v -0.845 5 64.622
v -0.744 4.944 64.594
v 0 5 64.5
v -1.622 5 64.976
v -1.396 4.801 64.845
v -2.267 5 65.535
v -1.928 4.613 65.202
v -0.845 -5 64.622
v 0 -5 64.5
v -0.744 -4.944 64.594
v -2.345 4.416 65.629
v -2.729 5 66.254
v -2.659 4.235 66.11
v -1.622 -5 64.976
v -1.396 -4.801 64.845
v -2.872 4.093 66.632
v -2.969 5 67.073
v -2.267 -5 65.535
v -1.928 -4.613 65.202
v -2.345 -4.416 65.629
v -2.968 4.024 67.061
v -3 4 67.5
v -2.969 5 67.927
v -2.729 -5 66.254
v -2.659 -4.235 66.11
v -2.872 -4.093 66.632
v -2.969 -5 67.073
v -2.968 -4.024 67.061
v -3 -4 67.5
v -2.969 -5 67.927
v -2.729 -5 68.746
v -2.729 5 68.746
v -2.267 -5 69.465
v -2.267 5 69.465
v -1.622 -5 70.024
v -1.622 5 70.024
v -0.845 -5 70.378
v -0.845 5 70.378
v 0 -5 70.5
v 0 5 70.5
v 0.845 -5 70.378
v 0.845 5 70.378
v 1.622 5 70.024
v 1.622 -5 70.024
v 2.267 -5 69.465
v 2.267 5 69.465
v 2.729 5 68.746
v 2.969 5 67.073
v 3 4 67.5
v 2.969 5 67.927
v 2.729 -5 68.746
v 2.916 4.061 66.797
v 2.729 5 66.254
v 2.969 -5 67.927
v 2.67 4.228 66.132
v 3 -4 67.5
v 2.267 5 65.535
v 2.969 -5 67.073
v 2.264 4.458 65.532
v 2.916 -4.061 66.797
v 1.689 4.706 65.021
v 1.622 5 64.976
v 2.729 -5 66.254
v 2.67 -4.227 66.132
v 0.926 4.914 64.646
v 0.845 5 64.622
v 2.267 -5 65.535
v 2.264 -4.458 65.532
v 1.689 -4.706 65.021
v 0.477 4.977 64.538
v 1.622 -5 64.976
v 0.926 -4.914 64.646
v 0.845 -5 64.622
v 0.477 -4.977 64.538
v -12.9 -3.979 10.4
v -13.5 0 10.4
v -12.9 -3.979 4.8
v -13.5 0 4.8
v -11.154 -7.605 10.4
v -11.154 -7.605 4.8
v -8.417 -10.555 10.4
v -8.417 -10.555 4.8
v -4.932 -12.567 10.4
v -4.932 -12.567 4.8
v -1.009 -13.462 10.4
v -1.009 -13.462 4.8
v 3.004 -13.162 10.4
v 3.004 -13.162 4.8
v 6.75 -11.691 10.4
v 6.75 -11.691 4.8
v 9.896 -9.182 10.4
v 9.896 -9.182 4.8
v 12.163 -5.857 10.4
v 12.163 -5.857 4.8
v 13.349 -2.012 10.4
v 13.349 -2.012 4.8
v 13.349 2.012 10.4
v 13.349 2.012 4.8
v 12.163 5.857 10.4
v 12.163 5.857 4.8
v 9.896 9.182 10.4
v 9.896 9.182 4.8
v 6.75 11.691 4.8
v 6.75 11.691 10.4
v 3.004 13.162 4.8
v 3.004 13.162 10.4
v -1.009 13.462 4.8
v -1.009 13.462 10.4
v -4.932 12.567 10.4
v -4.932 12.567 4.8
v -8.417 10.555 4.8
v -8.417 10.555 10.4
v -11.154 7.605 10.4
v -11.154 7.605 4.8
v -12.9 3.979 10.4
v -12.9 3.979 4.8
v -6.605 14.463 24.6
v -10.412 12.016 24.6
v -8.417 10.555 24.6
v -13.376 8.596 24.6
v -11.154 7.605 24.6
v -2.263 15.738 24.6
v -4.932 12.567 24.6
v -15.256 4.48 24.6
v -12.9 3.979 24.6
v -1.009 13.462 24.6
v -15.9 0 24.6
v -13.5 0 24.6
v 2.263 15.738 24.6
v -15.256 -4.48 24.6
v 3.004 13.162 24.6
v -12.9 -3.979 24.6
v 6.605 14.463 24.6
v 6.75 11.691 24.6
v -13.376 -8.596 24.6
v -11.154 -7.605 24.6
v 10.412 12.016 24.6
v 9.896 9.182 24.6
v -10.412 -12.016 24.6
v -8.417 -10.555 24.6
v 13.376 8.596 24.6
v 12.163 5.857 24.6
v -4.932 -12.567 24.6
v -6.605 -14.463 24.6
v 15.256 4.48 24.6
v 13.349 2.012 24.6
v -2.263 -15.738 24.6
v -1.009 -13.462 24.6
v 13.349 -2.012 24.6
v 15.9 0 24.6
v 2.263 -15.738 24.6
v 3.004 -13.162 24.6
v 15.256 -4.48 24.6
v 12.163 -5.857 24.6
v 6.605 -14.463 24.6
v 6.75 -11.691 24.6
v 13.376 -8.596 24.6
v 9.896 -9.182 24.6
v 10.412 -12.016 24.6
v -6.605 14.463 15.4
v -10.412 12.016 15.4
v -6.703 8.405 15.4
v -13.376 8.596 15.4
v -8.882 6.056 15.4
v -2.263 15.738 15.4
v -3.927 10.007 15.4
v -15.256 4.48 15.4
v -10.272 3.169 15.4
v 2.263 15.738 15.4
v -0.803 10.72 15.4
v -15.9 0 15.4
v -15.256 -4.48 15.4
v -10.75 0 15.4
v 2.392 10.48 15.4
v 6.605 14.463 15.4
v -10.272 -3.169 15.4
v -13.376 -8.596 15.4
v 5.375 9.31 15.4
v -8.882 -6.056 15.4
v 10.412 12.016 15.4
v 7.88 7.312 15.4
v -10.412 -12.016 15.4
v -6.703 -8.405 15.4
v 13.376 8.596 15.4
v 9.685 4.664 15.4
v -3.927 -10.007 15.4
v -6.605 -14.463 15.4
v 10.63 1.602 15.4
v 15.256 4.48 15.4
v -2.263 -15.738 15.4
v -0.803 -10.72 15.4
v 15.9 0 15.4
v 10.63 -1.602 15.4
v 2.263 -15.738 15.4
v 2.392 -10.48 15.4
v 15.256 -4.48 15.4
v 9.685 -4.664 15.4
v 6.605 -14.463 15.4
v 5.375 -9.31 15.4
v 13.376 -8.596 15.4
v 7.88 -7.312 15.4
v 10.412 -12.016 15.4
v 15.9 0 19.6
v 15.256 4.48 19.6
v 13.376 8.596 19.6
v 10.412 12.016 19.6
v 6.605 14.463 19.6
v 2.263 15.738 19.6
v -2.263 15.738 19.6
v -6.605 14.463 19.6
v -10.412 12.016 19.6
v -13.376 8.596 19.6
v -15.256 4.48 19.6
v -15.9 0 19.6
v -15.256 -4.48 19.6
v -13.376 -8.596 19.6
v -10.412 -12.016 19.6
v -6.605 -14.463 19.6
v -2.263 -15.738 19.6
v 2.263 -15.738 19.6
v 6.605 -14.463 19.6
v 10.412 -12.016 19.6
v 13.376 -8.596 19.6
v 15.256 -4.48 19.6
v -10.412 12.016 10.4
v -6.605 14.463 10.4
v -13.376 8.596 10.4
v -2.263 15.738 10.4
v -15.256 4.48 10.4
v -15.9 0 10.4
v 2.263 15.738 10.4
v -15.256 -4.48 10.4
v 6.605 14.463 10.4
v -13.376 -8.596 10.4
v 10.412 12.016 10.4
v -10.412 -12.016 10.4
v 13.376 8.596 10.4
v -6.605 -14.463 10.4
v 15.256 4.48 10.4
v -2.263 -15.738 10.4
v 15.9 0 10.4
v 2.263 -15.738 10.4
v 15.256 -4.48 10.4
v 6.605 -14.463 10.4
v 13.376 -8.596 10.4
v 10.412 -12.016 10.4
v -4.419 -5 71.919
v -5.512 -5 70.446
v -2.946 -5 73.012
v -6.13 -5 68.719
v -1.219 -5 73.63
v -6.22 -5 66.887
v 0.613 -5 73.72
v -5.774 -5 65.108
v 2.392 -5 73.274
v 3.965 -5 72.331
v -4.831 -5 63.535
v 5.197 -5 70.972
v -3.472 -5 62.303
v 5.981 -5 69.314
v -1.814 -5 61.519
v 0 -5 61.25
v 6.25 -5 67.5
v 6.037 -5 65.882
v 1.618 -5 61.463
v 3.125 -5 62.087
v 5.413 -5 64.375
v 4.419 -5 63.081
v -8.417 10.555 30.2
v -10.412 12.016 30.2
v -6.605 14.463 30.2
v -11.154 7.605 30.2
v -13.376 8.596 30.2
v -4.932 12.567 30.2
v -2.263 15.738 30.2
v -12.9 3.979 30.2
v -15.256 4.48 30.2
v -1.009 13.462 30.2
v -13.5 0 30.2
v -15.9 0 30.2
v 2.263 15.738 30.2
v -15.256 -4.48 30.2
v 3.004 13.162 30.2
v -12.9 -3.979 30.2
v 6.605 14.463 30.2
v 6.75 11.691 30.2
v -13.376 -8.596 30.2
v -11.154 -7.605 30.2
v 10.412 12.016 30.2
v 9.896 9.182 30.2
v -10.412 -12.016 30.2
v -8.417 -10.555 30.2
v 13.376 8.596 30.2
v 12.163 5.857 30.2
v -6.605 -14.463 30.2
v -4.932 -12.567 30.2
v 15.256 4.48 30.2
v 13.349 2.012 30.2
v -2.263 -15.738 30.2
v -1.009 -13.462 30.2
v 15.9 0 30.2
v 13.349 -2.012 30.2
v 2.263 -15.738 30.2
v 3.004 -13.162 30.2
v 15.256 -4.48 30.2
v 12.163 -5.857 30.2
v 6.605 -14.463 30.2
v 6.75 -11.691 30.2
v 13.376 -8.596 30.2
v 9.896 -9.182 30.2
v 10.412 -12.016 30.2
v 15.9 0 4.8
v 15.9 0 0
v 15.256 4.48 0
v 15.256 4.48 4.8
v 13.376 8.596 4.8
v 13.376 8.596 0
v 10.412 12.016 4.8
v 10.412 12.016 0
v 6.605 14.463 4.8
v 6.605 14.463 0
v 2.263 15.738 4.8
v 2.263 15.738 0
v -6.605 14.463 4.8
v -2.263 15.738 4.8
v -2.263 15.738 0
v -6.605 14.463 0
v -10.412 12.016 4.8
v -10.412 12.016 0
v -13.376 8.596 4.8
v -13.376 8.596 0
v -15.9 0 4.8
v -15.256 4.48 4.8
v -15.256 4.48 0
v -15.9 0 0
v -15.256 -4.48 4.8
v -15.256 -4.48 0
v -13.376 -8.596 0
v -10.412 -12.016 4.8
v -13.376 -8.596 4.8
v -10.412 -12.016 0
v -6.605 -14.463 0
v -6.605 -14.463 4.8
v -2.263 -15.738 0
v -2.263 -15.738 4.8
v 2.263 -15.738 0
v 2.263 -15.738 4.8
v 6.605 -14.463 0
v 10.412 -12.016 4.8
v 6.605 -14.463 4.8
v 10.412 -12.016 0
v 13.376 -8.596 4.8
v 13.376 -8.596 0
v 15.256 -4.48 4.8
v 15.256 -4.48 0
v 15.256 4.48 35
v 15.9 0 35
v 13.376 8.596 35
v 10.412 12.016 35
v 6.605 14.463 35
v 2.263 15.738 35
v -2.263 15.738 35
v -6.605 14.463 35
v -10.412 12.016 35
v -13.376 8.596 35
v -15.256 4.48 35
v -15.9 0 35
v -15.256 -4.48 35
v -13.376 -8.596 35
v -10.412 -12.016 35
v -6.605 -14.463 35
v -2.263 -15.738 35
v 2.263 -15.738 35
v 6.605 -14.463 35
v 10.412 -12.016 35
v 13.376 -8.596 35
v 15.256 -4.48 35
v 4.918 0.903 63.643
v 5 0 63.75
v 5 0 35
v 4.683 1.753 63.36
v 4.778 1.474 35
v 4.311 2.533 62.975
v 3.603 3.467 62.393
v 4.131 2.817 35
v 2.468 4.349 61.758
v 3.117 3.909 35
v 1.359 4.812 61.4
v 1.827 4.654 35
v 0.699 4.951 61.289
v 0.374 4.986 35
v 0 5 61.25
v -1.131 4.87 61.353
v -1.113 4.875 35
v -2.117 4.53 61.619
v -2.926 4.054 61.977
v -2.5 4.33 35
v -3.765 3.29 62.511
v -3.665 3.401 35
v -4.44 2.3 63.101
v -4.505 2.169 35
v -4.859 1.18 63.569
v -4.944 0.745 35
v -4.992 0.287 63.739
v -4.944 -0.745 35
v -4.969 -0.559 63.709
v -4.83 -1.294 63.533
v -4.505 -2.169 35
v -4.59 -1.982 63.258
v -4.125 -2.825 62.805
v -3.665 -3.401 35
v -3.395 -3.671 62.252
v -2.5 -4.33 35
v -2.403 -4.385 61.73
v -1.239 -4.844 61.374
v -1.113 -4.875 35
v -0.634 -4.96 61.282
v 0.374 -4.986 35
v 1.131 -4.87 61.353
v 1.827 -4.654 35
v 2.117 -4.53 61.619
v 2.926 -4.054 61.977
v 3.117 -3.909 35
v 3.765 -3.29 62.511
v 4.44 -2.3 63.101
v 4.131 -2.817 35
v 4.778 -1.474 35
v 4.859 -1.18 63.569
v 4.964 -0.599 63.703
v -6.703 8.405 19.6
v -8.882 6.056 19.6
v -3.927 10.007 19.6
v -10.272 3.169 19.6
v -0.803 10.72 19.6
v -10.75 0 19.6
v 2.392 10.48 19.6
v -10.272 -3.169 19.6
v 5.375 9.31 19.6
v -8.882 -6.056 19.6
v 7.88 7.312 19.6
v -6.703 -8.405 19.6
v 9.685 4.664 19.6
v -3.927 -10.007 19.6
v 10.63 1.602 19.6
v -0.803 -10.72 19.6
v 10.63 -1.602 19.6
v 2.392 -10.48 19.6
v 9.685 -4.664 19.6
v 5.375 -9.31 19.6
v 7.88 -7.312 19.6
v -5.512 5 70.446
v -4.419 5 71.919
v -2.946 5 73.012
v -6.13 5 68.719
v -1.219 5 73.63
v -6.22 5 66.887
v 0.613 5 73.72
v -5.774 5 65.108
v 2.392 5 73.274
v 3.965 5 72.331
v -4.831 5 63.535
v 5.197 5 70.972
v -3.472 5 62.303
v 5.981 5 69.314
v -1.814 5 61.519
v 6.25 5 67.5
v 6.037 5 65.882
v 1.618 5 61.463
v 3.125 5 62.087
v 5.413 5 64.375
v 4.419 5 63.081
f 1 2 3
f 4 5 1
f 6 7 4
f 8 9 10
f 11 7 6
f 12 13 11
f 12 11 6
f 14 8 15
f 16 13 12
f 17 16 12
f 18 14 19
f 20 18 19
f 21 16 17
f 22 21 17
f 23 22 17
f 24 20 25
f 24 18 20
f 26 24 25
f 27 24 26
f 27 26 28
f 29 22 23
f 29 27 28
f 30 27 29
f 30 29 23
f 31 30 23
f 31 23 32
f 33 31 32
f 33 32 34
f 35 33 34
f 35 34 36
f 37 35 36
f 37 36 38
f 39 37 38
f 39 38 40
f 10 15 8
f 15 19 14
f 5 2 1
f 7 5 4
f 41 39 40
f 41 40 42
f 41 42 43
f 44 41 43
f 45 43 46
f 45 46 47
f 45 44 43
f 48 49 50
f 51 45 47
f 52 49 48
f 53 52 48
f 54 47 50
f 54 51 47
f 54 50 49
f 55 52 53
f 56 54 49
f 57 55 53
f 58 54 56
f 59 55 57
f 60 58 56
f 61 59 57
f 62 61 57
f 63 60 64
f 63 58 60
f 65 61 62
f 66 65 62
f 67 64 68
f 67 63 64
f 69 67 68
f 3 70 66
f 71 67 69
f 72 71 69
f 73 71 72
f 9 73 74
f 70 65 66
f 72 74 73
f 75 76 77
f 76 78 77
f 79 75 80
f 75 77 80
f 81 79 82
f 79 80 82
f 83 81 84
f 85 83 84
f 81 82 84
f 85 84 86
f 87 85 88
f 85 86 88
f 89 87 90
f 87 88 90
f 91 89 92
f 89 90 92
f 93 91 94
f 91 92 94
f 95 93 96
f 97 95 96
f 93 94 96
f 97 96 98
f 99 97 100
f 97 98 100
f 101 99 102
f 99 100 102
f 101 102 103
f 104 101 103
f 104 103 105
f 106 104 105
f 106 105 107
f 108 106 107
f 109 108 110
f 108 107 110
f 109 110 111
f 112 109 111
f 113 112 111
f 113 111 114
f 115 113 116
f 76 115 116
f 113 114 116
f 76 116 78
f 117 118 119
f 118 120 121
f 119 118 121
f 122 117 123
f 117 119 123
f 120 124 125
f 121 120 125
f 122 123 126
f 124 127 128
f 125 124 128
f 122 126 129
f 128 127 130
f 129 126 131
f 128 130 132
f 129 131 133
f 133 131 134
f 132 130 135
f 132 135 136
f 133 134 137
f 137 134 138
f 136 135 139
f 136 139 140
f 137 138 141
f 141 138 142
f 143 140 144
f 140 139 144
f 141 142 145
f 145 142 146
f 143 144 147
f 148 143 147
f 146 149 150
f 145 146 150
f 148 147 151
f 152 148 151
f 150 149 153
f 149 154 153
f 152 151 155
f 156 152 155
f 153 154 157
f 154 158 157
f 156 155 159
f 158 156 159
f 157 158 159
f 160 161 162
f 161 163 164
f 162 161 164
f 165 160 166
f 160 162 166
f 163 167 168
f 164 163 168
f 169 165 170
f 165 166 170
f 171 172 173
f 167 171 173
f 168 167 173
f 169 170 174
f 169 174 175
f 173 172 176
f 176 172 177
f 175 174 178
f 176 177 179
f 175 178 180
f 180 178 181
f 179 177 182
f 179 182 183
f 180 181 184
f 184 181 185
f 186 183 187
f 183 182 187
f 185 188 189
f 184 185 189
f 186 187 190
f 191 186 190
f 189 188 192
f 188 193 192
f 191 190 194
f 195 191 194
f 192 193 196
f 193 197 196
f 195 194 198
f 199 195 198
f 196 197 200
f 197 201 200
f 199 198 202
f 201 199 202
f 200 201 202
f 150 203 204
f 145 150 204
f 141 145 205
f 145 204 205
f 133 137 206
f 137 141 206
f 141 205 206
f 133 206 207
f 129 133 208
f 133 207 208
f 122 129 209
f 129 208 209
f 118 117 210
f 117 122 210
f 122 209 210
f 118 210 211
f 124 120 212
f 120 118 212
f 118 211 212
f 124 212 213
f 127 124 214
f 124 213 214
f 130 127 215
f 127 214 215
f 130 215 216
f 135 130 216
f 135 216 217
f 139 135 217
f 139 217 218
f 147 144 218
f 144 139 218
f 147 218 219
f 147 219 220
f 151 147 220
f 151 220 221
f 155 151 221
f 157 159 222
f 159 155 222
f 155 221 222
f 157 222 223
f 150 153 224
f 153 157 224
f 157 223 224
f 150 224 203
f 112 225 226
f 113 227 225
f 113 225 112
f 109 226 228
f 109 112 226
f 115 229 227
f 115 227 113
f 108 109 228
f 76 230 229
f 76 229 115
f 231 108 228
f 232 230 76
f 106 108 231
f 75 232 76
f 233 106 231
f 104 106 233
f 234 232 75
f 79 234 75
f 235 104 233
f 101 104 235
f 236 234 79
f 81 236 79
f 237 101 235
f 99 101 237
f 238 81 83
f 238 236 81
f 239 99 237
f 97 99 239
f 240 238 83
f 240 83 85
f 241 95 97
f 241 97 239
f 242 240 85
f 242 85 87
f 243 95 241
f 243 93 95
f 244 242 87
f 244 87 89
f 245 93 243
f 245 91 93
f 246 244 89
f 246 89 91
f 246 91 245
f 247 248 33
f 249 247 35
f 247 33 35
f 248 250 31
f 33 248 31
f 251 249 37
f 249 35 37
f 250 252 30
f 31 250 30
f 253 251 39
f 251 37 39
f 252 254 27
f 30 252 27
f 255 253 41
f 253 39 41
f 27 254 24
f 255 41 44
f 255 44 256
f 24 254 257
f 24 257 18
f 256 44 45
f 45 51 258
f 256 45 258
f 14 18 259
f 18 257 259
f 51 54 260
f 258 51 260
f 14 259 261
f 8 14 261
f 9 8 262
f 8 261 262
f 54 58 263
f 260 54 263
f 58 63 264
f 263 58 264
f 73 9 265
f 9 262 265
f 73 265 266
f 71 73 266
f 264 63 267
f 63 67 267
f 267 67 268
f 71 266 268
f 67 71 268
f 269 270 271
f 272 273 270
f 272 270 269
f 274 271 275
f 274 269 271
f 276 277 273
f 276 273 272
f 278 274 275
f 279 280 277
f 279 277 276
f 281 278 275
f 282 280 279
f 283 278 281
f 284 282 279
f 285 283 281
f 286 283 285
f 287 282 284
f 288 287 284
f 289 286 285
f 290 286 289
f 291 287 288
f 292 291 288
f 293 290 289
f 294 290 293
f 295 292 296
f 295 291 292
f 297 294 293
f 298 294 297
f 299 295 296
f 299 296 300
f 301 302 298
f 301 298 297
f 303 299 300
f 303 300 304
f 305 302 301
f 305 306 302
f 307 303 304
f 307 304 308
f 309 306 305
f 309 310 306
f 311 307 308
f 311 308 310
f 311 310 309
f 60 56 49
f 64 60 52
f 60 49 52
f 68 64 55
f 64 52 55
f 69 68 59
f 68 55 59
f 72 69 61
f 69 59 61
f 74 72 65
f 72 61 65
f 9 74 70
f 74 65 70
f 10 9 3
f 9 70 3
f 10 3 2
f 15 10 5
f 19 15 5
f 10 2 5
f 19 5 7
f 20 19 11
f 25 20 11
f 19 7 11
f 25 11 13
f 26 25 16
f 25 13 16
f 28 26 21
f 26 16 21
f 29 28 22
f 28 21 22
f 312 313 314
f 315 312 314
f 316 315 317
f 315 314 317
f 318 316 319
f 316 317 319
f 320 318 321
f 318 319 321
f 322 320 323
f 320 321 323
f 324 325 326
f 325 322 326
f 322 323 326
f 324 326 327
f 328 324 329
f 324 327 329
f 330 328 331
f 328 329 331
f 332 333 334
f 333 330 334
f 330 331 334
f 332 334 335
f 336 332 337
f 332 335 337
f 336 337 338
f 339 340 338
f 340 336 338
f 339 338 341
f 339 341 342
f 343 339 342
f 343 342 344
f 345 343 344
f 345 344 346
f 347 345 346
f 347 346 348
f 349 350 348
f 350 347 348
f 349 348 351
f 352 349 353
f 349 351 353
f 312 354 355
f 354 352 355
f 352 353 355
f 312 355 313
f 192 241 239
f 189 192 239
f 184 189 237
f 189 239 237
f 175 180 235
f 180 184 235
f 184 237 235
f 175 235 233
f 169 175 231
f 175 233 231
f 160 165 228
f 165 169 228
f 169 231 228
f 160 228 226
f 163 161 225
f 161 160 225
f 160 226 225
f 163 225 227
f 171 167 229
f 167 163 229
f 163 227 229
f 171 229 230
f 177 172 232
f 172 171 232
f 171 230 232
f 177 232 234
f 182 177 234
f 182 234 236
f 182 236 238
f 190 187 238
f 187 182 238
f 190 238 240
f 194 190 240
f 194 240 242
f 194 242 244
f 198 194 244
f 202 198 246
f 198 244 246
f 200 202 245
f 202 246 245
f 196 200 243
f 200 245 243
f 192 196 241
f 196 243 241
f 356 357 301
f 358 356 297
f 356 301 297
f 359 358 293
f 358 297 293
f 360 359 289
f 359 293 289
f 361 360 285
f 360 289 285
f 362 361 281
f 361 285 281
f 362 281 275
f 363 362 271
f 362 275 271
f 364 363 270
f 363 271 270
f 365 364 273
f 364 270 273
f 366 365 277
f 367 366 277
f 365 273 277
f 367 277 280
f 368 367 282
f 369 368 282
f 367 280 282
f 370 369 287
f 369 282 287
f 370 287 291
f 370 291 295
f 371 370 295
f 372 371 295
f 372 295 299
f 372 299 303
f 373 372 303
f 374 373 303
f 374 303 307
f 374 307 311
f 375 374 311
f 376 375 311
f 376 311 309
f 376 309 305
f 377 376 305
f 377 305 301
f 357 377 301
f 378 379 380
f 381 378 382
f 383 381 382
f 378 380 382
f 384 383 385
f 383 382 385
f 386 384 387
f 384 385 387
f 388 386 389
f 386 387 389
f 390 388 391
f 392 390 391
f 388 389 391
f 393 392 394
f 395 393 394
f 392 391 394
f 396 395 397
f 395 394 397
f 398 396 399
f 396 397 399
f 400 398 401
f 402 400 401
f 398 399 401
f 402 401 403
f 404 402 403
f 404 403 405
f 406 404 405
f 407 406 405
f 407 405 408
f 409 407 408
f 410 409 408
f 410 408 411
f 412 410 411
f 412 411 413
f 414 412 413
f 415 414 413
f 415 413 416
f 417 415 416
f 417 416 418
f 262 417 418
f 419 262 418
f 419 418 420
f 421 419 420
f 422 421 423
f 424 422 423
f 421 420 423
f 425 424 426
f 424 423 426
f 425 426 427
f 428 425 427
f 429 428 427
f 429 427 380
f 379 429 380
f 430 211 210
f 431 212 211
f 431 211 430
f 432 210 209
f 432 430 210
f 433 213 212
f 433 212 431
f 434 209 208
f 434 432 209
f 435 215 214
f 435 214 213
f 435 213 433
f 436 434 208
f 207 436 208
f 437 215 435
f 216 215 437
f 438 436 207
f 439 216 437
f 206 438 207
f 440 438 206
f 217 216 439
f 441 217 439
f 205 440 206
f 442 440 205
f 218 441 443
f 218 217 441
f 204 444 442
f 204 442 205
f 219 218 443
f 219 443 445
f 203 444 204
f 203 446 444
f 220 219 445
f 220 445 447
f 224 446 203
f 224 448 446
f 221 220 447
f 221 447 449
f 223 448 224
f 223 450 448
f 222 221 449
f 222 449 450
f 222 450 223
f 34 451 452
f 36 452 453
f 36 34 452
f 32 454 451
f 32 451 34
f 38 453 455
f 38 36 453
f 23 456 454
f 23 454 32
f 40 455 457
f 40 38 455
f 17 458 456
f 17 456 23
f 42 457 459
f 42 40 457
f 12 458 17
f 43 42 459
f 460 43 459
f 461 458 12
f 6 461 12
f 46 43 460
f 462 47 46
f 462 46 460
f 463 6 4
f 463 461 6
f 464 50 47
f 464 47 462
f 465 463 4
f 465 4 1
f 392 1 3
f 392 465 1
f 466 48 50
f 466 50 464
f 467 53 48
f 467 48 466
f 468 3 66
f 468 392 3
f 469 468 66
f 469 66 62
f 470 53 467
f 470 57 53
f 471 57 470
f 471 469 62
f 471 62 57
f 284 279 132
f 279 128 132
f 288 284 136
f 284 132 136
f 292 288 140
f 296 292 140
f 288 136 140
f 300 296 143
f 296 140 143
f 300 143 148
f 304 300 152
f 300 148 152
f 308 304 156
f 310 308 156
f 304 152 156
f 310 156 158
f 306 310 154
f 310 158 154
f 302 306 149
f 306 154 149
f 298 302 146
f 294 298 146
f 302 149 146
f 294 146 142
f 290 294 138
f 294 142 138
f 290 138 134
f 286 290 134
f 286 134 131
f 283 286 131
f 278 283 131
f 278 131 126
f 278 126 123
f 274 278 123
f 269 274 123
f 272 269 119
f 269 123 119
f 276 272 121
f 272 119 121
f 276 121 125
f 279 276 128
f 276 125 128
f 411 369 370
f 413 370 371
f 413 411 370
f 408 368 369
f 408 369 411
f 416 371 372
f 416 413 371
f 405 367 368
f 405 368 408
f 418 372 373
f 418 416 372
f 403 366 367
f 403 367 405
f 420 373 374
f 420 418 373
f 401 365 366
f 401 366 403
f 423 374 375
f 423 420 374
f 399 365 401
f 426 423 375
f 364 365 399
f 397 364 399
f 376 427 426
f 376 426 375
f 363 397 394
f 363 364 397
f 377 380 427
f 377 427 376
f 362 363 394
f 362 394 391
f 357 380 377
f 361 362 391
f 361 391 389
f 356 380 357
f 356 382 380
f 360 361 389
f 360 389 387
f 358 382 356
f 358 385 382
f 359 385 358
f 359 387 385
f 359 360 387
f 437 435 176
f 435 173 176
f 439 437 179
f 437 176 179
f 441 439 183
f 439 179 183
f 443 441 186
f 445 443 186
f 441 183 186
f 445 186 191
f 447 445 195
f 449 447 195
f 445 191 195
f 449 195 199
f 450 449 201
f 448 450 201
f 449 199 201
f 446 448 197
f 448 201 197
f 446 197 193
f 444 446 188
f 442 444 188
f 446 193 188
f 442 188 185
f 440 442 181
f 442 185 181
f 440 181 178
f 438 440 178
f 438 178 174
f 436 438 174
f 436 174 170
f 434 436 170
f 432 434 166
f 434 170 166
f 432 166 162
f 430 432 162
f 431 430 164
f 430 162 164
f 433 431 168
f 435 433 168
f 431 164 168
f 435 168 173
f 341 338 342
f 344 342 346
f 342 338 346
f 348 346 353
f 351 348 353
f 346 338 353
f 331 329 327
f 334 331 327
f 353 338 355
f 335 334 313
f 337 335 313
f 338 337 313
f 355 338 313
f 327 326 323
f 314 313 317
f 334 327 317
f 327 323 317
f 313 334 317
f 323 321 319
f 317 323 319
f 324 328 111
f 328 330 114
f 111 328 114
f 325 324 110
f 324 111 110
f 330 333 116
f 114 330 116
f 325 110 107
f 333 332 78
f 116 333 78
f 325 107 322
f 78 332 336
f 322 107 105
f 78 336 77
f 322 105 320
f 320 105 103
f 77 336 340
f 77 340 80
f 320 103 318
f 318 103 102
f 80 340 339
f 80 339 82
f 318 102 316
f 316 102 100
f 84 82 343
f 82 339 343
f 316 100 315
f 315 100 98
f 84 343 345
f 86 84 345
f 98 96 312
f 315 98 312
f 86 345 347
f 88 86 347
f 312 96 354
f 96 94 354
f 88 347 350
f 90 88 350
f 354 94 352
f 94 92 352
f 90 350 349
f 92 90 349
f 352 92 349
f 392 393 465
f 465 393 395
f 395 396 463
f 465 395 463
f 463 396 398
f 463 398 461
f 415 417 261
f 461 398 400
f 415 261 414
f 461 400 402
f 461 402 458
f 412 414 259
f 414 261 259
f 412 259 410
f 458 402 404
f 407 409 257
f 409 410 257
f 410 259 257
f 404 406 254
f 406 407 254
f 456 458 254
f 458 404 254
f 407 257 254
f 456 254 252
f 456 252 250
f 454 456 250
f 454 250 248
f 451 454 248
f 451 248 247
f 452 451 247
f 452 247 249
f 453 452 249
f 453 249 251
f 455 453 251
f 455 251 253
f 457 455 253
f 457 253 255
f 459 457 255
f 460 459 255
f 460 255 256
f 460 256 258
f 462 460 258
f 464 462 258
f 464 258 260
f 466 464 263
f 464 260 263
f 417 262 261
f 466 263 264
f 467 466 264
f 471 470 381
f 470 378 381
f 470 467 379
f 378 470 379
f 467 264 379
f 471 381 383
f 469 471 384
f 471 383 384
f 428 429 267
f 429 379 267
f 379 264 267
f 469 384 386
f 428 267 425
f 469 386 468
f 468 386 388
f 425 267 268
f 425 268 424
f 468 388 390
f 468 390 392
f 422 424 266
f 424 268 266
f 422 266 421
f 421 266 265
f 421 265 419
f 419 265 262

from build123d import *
from build123d.topology import SkipClean

# Parameters (mm, degrees)
SKETCH3_R                = 15.9
BOSS_EXTRUDE1_DEPTH      = 35
SKETCH4_R                = 5
BOSS_EXTRUDE2_DEPTH      = 32.5
SKETCH7_W                = 4.2
SKETCH7_H                = 5.15
SKETCH7_W_2              = 5.6
SKETCH7_H_2              = 2.4
BOSS_EXTRUDE3_DEPTH      = 5
BOSS_EXTRUDE3_DEPTH_BACK = 5
SKETCH8_R                = 6.25
SKETCH8_R_2              = 3
SKETCH9_R                = 3
CUT_EXTRUDE1_DEPTH       = 16


with BuildPart() as part:
    # Sketch3 → Boss-Extrude1 (new body)
    with BuildSketch(Plane.XY):
        Circle(SKETCH3_R)
    extrude(amount=BOSS_EXTRUDE1_DEPTH)

    # Sketch4 → Boss-Extrude2 (add)
    with BuildSketch(Plane.XY.offset(35)):
        Circle(SKETCH4_R)
    extrude(amount=BOSS_EXTRUDE2_DEPTH)

    # Sketch7 → Cut-Revolve1 (revolve, cut)
    with BuildSketch(Plane(origin=(0, 0, 0), x_dir=(0, 0, -1), z_dir=(1, 0, 0))):
        with Locations((-17.5, 13.325)):
            Rectangle(SKETCH7_W, SKETCH7_H)
        with Locations((-27.4, 14.7)):
            Rectangle(SKETCH7_W_2, SKETCH7_H_2)
        with Locations((-7.6, 14.7)):
            Rectangle(SKETCH7_W_2, SKETCH7_H_2)
    revolve(axis=Axis((0, 0, -11.998492927), (0, 0, 1)), mode=Mode.SUBTRACT)

    # Sketch8 → Boss-Extrude3 (add, two sides: drawn at the far end of the back side and taken through both)
    with SkipClean():  # the faces are left unmerged after this step: merging them gives an invalid solid
        with BuildSketch(Plane(origin=(0, 0, 0), x_dir=(1, 0, 0), z_dir=(0, 1, 0)).offset(-BOSS_EXTRUDE3_DEPTH_BACK)):
            with Locations((0, -67.5)):
                Circle(SKETCH8_R)
            with Locations((0, -67.5)):
                Circle(SKETCH8_R_2, mode=Mode.SUBTRACT)
        extrude(amount=BOSS_EXTRUDE3_DEPTH + BOSS_EXTRUDE3_DEPTH_BACK)

    # Sketch9 → Cut-Extrude1 (cut)
    with SkipClean():  # the faces are left unmerged after this step: merging them gives an invalid solid
        with BuildSketch(Plane(origin=(0, 5, 0), x_dir=(1, 0, 0), z_dir=(0, 1, 0))):
            with Locations((0, -67.5)):
                Circle(SKETCH9_R)
        extrude(amount=-CUT_EXTRUDE1_DEPTH, mode=Mode.SUBTRACT)


solid = part.part
